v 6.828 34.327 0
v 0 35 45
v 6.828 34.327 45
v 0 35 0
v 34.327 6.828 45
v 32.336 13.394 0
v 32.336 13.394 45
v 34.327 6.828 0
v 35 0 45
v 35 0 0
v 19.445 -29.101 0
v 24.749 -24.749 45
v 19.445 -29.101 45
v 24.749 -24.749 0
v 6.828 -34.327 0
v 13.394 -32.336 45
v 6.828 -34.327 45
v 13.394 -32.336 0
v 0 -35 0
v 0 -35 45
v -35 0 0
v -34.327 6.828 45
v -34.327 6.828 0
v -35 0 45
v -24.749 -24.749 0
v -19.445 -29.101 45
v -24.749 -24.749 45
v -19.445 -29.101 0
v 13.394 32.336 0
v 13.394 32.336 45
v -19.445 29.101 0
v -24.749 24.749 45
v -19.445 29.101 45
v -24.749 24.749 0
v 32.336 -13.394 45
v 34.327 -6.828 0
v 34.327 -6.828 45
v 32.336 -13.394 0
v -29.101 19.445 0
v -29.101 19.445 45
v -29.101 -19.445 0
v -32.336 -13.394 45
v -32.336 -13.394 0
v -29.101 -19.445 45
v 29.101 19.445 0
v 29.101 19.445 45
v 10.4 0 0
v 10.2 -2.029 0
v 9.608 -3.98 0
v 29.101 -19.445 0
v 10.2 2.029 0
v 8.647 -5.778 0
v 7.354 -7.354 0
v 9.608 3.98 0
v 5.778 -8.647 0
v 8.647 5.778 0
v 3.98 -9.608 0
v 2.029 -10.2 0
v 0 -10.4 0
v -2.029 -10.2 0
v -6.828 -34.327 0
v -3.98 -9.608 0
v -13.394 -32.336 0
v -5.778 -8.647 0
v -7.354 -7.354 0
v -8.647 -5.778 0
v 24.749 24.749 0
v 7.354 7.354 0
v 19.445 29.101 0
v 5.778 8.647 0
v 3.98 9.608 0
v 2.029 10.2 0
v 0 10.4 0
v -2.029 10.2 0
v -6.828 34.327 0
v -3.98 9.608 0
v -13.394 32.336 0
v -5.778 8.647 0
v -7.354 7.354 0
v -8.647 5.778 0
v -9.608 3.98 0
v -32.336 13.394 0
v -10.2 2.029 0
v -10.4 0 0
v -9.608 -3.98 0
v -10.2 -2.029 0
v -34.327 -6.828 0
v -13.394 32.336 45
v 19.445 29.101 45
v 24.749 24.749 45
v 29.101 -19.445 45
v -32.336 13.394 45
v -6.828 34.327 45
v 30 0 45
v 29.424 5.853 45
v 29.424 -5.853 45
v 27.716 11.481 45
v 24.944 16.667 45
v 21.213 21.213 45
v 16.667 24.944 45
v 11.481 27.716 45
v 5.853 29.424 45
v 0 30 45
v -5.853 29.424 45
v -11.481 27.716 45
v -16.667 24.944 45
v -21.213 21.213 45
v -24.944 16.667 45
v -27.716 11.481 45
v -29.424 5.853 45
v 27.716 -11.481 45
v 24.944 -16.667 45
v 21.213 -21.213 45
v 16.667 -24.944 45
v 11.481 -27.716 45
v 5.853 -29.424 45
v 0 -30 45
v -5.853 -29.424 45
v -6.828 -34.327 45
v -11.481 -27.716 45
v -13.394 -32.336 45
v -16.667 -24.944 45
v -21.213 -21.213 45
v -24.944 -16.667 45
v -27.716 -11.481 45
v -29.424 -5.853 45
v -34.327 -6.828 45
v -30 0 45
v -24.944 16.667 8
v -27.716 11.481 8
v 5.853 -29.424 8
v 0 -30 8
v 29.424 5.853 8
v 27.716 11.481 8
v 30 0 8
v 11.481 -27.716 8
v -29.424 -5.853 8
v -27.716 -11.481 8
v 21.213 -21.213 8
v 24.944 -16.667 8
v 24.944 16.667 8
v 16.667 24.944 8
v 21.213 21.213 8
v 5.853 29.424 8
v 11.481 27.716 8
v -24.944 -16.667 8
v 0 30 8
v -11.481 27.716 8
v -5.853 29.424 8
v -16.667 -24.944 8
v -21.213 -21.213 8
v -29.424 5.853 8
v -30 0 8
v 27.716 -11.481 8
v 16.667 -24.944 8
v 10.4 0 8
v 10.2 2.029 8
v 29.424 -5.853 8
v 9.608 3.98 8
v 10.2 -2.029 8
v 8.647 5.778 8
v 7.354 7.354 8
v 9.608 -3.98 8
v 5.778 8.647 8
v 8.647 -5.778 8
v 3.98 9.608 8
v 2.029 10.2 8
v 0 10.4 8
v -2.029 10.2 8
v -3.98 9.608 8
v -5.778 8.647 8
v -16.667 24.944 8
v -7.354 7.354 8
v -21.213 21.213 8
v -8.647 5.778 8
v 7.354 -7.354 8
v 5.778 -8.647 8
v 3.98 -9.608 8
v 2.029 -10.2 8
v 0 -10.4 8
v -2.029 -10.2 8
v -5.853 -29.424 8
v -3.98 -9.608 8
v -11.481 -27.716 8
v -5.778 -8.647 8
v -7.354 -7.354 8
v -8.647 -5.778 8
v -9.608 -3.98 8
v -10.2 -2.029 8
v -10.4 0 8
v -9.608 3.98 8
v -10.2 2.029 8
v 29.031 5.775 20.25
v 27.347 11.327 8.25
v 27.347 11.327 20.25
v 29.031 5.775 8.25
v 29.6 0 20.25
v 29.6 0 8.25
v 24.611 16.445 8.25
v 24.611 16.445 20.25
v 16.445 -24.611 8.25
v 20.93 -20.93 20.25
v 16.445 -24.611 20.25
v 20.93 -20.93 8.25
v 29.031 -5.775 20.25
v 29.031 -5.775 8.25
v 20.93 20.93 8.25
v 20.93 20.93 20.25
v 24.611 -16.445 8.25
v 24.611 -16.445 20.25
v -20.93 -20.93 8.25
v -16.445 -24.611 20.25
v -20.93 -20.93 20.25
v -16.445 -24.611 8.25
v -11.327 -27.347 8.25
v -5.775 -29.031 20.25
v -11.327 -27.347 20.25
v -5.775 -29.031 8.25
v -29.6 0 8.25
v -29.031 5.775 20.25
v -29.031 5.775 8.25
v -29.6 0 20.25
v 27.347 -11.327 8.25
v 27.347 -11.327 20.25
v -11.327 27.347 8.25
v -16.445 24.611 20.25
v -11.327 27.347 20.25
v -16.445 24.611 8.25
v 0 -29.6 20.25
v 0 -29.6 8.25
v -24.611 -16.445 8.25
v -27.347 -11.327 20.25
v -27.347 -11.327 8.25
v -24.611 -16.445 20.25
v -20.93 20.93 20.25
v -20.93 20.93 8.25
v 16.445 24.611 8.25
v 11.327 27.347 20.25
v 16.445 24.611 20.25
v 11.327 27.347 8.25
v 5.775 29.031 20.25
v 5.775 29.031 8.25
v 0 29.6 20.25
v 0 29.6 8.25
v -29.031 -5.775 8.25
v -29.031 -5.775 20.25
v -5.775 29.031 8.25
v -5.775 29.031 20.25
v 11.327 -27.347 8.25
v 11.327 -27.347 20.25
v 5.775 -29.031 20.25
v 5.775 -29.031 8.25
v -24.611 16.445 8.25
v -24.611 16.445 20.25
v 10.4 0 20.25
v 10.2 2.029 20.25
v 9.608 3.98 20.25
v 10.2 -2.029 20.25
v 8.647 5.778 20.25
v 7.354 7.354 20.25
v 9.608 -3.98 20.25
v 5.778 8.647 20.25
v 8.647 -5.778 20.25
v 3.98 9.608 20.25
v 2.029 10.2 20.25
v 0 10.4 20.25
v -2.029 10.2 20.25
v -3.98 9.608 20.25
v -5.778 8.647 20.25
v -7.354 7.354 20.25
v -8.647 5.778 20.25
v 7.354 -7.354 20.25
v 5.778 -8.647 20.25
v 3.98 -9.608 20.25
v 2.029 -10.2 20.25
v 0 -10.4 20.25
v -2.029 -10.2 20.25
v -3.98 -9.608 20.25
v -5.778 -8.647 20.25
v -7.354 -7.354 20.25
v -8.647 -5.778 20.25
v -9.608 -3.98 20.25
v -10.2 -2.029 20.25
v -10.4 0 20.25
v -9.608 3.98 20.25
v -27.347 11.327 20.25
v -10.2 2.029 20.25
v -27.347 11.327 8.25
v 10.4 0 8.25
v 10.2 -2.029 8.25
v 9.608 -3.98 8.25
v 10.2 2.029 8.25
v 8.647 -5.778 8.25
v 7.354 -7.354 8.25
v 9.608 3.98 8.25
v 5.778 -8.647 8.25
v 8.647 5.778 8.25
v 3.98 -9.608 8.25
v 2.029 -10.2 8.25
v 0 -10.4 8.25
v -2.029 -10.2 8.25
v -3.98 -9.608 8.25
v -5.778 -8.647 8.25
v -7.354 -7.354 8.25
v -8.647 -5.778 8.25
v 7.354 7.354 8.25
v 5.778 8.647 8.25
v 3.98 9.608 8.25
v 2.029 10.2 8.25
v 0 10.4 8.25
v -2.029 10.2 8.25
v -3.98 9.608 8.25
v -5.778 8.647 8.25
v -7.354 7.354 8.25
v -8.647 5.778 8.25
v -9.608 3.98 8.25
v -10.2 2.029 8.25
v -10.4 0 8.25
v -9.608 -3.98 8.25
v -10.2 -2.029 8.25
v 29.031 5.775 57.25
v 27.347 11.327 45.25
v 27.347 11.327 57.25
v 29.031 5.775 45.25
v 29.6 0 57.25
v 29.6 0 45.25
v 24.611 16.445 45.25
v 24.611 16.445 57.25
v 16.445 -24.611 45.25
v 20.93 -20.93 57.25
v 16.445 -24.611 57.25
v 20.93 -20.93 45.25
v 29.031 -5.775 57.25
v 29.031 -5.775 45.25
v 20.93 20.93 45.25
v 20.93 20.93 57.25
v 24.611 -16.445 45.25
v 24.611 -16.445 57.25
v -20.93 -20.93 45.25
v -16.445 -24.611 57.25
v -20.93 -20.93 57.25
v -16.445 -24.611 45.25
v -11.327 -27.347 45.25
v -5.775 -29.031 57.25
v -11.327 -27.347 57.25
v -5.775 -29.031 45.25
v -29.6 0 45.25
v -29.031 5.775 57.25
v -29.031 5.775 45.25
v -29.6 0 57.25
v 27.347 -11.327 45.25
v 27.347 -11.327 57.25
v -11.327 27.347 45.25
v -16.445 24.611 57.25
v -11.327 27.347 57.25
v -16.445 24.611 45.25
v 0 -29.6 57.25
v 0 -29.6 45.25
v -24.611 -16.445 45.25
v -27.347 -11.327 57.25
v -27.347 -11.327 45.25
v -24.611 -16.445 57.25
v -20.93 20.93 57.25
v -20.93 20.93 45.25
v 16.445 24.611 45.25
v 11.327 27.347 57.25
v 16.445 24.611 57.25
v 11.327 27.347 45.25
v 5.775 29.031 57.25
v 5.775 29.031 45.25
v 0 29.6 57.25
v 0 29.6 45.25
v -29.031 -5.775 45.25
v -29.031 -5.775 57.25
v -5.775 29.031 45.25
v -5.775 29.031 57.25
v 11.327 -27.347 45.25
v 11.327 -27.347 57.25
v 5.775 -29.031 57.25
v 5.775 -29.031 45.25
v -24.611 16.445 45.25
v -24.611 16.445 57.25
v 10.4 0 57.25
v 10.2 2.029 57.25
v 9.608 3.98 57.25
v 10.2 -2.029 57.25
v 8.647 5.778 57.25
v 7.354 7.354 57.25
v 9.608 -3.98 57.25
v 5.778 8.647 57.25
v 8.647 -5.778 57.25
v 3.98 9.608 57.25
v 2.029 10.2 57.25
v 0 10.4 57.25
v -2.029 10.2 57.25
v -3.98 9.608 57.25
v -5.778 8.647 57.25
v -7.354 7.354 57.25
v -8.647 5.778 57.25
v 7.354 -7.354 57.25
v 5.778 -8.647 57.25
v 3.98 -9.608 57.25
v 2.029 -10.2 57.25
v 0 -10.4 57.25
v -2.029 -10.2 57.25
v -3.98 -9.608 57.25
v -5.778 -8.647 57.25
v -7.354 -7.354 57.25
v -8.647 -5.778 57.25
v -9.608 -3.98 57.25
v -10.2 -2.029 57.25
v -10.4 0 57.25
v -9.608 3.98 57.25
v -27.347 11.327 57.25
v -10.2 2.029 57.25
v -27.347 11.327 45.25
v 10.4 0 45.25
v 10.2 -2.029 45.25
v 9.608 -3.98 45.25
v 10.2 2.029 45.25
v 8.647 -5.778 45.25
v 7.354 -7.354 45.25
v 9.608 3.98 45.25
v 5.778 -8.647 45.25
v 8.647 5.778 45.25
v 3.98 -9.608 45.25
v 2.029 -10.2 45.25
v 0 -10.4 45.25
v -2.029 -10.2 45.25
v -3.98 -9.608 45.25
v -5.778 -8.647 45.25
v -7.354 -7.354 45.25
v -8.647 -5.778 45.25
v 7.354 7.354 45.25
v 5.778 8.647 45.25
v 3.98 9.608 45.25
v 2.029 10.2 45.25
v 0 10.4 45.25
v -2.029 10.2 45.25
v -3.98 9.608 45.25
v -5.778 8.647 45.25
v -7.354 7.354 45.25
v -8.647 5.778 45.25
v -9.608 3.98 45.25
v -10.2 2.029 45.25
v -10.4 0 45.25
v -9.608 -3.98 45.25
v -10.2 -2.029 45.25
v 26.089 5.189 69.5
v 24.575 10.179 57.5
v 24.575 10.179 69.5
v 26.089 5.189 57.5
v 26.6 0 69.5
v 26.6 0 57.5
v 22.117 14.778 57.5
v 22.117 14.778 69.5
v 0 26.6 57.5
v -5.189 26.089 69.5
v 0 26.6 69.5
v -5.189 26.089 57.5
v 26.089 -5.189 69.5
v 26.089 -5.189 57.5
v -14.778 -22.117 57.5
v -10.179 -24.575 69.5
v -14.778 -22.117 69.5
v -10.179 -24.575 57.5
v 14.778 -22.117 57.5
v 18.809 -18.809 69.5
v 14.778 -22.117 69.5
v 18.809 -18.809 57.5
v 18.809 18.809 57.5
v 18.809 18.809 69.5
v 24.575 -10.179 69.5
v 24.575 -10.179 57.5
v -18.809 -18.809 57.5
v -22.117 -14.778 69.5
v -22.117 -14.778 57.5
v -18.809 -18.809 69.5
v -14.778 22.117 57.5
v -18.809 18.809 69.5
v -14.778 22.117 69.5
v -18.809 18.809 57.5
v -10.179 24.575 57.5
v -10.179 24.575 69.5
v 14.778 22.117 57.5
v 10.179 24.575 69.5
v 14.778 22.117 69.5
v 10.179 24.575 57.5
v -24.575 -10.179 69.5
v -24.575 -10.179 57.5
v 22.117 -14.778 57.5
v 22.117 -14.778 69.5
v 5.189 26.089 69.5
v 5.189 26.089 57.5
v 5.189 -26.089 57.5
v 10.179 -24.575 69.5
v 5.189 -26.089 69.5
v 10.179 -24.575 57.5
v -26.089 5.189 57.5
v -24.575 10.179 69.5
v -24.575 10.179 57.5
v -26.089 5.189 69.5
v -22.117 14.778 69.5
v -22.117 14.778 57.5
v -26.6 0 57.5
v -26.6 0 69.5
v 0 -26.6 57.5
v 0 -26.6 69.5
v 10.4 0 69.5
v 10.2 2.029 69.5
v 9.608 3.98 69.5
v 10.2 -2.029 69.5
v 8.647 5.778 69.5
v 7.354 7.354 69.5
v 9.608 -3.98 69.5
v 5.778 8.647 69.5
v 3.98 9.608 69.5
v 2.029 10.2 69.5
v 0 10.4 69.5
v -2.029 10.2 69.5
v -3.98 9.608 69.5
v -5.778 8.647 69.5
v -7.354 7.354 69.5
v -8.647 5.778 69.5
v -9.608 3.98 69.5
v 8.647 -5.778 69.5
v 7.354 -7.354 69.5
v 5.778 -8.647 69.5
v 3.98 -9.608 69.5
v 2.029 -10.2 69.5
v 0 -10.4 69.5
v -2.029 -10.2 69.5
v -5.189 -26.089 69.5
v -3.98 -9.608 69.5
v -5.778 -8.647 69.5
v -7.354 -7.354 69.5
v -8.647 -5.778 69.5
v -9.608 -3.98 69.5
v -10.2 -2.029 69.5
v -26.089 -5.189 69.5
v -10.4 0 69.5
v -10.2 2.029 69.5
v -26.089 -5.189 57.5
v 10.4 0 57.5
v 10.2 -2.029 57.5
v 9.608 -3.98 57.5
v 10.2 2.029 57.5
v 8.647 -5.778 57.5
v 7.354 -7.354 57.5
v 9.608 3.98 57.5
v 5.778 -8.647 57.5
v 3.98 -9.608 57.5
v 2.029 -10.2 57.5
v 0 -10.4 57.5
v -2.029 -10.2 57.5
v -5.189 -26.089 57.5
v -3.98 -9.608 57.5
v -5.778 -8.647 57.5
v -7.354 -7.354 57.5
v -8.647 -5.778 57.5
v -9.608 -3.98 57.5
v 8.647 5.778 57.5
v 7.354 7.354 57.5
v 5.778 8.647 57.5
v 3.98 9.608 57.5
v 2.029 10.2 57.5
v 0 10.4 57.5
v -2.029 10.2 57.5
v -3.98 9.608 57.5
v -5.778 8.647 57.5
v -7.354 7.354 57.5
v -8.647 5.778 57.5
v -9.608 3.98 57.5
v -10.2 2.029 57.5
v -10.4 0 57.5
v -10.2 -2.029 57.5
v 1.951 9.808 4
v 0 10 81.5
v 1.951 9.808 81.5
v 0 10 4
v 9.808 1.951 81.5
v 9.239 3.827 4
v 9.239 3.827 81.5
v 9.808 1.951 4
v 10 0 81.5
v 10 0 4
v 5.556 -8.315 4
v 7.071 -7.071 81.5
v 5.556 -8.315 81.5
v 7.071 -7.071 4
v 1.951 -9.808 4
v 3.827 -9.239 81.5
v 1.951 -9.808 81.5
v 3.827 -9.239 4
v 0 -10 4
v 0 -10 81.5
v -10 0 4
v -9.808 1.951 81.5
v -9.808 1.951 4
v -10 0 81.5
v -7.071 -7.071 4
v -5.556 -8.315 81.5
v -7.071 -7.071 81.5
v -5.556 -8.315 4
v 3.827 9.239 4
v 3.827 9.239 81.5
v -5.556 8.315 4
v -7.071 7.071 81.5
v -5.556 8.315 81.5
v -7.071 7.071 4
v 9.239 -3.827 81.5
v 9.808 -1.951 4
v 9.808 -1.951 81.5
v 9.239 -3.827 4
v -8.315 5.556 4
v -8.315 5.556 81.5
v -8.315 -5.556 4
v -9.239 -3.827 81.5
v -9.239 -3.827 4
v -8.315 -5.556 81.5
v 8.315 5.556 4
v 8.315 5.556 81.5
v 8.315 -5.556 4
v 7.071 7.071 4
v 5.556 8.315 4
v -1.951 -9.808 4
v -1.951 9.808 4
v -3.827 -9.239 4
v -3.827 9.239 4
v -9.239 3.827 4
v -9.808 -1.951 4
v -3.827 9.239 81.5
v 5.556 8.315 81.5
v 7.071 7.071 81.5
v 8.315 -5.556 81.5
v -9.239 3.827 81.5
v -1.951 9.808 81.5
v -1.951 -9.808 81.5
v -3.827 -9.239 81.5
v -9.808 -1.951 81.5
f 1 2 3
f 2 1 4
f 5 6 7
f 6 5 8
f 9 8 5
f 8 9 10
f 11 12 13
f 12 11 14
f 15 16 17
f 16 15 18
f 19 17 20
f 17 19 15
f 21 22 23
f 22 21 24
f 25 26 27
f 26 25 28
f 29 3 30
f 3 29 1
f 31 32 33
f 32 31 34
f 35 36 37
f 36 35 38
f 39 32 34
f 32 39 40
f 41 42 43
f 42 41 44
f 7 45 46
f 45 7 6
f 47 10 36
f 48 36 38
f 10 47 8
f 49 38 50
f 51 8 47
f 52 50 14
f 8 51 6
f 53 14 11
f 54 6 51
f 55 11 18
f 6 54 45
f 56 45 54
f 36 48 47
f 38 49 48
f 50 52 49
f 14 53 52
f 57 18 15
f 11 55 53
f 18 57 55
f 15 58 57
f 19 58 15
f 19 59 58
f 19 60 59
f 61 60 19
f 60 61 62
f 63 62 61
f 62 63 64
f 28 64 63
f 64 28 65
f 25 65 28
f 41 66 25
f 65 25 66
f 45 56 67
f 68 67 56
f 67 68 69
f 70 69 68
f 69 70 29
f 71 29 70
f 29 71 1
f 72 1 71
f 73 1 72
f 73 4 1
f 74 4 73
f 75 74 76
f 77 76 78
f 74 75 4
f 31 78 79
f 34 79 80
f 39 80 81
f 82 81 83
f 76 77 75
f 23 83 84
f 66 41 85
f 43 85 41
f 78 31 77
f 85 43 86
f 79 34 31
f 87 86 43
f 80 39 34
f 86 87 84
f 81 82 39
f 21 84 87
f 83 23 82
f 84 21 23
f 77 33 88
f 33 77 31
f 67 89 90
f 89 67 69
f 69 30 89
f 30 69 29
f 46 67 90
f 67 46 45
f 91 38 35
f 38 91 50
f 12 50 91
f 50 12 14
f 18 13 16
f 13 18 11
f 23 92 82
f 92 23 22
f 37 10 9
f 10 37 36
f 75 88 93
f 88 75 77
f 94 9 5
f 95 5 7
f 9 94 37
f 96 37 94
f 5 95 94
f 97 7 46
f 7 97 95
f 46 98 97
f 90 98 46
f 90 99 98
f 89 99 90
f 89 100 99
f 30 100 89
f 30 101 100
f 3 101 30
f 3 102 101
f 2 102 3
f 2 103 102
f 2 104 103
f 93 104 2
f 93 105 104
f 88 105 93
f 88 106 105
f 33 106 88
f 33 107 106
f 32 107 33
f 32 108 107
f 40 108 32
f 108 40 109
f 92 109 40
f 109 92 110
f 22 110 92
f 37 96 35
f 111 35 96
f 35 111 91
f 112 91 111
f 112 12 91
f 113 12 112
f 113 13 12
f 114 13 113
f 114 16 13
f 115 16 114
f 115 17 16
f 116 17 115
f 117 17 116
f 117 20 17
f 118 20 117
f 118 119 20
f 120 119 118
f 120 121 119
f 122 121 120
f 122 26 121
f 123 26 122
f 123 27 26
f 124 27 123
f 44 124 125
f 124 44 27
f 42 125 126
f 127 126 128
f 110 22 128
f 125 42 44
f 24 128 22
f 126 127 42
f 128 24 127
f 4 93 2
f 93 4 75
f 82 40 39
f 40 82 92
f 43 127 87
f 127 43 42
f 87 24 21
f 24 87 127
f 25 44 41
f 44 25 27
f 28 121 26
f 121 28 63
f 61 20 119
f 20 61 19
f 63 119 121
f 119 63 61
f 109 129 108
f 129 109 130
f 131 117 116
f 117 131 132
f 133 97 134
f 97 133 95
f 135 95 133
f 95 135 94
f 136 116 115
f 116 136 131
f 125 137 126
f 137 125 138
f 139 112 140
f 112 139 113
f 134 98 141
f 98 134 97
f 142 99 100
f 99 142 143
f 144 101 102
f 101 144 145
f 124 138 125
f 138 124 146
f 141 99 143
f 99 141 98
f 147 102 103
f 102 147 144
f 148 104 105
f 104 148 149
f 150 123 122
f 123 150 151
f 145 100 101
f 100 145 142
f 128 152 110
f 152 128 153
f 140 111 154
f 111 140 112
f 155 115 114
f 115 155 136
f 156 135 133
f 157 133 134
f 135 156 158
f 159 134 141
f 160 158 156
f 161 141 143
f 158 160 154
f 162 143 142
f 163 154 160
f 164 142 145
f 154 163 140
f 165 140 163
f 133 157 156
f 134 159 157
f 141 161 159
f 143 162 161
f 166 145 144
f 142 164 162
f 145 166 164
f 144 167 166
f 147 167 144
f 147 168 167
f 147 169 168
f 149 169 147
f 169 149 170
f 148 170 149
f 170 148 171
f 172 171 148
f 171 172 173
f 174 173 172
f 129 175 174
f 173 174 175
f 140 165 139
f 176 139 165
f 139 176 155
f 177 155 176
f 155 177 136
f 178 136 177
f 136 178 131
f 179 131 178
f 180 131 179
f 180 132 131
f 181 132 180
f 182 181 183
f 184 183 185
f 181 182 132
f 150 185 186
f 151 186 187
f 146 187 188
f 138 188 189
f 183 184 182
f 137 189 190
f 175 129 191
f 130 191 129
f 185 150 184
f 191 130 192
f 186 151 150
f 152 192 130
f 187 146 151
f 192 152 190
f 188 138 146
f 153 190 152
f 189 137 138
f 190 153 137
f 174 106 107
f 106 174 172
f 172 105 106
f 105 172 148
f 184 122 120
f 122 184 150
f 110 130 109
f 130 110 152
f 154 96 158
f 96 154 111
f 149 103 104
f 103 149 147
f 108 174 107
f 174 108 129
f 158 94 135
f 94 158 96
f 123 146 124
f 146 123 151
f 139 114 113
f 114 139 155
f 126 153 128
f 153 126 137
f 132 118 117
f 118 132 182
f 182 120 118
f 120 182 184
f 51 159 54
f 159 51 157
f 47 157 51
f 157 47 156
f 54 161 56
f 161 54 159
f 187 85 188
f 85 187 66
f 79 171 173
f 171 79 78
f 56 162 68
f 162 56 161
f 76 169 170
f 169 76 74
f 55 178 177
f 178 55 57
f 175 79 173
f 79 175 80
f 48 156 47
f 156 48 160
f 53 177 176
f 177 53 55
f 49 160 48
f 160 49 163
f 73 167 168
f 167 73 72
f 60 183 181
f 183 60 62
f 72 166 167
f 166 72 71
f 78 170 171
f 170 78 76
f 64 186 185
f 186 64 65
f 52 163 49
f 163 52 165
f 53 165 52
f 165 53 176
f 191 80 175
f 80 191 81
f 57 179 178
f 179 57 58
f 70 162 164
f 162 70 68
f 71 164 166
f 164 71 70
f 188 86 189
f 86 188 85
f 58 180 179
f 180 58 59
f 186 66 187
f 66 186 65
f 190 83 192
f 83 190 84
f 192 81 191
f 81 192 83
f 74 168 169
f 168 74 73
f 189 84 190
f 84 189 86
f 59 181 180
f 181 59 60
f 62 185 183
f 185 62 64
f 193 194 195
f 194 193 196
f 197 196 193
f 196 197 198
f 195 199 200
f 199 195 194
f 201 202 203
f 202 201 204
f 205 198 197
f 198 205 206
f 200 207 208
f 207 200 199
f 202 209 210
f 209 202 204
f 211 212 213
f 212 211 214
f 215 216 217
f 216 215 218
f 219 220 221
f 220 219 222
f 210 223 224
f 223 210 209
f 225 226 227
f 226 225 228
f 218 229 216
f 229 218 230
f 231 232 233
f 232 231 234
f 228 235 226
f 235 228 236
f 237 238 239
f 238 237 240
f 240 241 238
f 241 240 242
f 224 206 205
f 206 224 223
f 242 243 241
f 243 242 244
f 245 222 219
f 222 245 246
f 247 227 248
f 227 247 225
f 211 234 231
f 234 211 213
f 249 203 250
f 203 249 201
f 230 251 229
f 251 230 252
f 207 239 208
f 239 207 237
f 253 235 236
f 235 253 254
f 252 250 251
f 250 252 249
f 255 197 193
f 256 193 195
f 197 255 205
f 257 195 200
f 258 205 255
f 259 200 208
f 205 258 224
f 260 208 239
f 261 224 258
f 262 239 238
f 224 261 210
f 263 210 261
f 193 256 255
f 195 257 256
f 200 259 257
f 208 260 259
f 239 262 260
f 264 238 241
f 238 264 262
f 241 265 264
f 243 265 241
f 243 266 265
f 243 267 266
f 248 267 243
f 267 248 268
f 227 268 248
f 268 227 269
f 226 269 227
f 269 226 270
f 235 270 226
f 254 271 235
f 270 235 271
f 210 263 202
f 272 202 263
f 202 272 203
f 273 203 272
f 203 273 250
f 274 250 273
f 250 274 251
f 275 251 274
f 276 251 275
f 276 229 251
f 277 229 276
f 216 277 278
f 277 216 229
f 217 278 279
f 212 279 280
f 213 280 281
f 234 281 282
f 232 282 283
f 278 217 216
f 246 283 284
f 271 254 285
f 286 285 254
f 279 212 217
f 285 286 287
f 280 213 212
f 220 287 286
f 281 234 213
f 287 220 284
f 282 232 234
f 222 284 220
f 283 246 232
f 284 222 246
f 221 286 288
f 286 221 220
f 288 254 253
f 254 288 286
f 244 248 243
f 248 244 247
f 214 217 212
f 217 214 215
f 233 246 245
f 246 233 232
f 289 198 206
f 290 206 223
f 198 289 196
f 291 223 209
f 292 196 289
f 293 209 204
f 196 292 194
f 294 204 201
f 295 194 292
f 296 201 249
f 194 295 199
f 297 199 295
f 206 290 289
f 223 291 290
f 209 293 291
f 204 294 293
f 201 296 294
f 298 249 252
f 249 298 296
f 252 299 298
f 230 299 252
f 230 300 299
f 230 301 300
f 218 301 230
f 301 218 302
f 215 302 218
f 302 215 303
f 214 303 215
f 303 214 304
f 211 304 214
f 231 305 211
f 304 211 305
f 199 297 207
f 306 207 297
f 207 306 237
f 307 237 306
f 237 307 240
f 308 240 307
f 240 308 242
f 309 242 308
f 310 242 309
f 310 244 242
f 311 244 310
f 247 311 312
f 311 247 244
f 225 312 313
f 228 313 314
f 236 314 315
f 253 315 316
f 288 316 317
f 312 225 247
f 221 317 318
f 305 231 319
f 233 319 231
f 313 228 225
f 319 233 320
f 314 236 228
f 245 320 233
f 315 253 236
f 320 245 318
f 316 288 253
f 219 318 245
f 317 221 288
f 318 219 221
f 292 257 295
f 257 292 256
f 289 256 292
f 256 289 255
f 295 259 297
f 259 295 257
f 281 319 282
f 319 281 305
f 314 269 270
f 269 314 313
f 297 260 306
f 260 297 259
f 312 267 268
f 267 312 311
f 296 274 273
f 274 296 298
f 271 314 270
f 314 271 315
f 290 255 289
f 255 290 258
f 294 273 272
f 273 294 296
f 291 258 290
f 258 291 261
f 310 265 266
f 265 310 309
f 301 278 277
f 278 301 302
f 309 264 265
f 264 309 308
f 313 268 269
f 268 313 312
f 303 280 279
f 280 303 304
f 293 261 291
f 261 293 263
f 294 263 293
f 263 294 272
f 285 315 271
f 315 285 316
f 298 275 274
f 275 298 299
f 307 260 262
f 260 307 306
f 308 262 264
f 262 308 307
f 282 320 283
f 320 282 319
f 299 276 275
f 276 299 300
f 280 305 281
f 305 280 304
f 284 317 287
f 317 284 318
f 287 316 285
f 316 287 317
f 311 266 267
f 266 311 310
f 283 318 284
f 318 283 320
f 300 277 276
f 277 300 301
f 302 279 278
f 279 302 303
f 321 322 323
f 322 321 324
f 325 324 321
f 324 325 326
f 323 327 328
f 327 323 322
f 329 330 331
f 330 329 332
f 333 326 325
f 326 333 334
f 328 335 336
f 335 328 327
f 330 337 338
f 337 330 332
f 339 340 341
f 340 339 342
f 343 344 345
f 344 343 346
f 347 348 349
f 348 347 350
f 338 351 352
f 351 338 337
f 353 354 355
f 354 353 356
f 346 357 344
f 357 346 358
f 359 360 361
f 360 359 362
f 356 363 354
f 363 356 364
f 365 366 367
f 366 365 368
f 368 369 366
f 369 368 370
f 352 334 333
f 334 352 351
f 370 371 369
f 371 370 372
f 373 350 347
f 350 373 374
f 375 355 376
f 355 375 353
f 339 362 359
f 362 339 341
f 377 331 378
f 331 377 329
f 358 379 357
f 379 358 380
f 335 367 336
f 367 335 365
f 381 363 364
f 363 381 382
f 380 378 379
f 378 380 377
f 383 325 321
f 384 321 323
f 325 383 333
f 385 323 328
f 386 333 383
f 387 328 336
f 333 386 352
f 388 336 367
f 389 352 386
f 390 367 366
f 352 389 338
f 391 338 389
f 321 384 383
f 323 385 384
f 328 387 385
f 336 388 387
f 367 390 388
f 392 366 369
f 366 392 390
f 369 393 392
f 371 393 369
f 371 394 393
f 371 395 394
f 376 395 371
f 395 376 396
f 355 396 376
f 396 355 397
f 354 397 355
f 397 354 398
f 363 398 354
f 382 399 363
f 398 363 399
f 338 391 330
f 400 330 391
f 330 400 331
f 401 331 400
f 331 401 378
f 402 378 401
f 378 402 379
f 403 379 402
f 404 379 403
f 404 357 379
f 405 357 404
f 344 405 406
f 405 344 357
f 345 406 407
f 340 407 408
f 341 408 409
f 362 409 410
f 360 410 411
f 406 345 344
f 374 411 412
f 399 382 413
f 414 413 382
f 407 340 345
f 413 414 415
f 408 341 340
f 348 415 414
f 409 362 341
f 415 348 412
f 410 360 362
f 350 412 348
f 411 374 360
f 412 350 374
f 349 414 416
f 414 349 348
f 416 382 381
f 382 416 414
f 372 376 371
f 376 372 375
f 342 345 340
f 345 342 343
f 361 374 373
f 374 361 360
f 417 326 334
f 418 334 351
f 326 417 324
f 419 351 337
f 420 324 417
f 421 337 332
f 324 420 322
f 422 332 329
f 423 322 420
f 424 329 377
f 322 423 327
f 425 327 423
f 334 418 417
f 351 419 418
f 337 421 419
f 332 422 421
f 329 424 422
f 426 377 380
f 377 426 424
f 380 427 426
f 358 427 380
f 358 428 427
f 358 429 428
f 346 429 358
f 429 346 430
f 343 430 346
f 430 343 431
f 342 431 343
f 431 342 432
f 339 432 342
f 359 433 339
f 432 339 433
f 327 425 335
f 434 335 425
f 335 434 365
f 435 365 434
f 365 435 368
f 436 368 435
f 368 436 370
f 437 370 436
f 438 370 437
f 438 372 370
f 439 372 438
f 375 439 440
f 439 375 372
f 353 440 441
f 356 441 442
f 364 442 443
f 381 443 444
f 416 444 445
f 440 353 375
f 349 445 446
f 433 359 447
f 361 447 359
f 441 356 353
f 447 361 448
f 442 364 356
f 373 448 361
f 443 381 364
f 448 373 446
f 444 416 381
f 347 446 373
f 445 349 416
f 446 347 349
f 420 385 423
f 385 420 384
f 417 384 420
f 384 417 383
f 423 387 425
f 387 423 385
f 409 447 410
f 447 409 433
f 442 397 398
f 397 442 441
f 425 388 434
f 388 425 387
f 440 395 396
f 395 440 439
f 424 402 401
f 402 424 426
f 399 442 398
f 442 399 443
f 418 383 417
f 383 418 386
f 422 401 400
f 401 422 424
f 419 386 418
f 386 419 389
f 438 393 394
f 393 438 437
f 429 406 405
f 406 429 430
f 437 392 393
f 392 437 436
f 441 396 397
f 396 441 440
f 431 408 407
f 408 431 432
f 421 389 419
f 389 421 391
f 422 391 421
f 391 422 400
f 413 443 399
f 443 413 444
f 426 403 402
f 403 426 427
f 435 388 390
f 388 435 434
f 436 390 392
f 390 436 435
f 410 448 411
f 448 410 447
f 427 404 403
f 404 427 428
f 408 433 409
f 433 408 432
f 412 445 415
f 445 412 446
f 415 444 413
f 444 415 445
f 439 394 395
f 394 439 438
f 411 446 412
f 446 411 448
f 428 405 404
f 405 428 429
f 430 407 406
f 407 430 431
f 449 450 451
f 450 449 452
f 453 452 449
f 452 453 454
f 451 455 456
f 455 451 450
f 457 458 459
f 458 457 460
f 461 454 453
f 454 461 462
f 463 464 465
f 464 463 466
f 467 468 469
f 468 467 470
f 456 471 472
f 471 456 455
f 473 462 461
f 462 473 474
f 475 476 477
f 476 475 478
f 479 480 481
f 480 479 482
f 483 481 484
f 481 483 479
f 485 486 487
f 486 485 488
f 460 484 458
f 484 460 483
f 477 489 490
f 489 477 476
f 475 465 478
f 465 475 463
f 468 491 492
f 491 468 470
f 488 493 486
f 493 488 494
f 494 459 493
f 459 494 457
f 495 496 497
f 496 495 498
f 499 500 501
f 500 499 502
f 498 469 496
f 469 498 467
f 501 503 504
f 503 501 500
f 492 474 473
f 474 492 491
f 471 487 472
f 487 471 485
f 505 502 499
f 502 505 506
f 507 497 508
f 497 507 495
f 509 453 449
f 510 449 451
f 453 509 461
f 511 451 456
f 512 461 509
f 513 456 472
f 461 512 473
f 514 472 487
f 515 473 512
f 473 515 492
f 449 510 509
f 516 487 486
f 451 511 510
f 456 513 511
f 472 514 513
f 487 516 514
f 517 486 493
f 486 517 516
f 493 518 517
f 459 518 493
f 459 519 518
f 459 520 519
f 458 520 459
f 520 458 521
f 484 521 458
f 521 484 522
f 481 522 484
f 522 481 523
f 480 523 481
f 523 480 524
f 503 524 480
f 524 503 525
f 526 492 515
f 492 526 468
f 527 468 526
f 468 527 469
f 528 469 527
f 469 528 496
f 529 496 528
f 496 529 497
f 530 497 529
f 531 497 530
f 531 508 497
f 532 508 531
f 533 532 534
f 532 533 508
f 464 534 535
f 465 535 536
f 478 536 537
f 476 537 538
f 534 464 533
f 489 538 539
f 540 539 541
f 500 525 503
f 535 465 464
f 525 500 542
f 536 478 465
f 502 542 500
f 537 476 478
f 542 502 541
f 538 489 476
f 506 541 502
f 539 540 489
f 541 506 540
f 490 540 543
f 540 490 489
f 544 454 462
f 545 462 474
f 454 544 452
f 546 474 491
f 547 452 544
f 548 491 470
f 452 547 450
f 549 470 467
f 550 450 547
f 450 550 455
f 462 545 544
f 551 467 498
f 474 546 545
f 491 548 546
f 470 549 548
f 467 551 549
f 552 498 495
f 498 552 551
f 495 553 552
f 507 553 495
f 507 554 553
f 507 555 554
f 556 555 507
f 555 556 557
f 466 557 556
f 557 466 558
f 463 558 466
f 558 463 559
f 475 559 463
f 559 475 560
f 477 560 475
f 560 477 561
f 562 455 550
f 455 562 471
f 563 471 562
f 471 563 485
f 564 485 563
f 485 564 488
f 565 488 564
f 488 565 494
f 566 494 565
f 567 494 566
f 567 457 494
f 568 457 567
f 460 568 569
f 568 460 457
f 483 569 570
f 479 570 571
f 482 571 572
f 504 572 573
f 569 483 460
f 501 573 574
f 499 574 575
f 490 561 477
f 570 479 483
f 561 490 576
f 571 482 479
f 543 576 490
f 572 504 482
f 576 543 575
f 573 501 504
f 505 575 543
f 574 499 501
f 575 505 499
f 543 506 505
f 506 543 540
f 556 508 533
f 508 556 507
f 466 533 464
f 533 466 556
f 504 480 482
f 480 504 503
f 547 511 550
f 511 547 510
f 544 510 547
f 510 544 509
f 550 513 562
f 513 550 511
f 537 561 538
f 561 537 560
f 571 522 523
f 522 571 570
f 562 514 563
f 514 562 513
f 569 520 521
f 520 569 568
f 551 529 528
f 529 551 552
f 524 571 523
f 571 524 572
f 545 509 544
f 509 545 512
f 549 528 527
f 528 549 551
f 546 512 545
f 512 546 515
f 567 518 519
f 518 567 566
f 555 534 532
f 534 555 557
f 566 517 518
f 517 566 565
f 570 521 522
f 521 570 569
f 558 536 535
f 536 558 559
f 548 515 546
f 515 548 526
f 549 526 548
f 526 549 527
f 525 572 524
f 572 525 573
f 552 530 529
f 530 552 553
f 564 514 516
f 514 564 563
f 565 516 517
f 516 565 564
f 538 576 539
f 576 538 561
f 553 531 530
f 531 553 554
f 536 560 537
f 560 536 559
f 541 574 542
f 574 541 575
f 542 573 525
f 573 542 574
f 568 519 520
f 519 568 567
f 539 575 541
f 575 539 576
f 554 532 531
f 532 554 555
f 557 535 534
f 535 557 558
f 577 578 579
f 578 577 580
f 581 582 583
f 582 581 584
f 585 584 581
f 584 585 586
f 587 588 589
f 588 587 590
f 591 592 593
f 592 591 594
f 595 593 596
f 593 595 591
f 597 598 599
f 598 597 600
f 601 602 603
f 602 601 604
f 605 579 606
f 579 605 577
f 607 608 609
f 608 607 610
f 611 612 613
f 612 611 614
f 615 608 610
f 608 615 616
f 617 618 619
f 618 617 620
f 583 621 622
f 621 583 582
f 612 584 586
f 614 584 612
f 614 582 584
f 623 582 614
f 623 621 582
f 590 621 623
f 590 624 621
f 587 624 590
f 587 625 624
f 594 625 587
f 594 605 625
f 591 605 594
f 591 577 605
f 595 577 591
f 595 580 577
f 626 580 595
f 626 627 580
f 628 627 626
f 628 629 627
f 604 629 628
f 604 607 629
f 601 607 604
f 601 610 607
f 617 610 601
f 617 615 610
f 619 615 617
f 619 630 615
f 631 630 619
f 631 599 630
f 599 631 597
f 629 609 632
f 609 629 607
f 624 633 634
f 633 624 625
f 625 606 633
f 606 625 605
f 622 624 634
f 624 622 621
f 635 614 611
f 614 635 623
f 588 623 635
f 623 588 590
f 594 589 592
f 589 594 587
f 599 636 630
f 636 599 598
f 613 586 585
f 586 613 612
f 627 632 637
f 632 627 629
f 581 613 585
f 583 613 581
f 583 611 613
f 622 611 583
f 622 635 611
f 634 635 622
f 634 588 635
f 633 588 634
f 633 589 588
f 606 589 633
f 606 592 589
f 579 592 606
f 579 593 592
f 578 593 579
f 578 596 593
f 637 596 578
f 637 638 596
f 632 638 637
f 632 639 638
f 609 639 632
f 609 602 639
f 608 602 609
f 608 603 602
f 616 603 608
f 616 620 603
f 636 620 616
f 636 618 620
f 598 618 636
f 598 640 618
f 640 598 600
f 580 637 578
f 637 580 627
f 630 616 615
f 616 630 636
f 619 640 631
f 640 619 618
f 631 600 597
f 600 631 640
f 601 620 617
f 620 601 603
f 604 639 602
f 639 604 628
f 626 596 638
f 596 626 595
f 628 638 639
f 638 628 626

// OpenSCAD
$fn = 32;

// ------------------------------------------------------------------------
// Bearing housing: housing d70, two bearings and a shaft
// Every part is its own module, assembly() places them once.
// ------------------------------------------------------------------------

// --- part 1 ---
module housing() {
  difference() {
    cylinder(h = 45, d = 70);
    translate([0, 0, 8]) cylinder(h = 38, d = 60);
    translate([0, 0, -1]) cylinder(h = 10, d = 20.8);
  }
}

// --- part 2 ---
module bearing_lower() {
  difference() {
      translate([0, 0, 0]) cylinder(h = 12, d = 59.2);
      translate([0, 0, -1]) cylinder(h = 14, d = 20.8);
    }
}

// --- part 3 ---
module bearing_upper() {
  difference() {
      translate([0, 0, 0]) cylinder(h = 12, d = 59.2);
      translate([0, 0, -1]) cylinder(h = 14, d = 20.8);
    }
}

// --- part 4 ---
module spacer() {
  difference() {
      translate([0, 0, 0]) cylinder(h = 12, d = 53.2);
      translate([0, 0, -1]) cylinder(h = 14, d = 20.8);
    }
}

// --- part 5 ---
module shaft() {
  translate([0, 0, -38.75]) cylinder(h = 77.5, d = 20);
}

// --- assembly ---
module assembly() {
  translate([0, 0, 0]) rotate([0, 0, 0]) housing();
  translate([0, 0, 8.25]) rotate([0, 0, 0]) bearing_lower();
  translate([0, 0, 45.25]) rotate([0, 0, 0]) bearing_upper();
  translate([0, 0, 57.5]) rotate([0, 0, 0]) spacer();
  translate([0, 0, 42.75]) rotate([0, 0, 0]) shaft();
}

assembly();
